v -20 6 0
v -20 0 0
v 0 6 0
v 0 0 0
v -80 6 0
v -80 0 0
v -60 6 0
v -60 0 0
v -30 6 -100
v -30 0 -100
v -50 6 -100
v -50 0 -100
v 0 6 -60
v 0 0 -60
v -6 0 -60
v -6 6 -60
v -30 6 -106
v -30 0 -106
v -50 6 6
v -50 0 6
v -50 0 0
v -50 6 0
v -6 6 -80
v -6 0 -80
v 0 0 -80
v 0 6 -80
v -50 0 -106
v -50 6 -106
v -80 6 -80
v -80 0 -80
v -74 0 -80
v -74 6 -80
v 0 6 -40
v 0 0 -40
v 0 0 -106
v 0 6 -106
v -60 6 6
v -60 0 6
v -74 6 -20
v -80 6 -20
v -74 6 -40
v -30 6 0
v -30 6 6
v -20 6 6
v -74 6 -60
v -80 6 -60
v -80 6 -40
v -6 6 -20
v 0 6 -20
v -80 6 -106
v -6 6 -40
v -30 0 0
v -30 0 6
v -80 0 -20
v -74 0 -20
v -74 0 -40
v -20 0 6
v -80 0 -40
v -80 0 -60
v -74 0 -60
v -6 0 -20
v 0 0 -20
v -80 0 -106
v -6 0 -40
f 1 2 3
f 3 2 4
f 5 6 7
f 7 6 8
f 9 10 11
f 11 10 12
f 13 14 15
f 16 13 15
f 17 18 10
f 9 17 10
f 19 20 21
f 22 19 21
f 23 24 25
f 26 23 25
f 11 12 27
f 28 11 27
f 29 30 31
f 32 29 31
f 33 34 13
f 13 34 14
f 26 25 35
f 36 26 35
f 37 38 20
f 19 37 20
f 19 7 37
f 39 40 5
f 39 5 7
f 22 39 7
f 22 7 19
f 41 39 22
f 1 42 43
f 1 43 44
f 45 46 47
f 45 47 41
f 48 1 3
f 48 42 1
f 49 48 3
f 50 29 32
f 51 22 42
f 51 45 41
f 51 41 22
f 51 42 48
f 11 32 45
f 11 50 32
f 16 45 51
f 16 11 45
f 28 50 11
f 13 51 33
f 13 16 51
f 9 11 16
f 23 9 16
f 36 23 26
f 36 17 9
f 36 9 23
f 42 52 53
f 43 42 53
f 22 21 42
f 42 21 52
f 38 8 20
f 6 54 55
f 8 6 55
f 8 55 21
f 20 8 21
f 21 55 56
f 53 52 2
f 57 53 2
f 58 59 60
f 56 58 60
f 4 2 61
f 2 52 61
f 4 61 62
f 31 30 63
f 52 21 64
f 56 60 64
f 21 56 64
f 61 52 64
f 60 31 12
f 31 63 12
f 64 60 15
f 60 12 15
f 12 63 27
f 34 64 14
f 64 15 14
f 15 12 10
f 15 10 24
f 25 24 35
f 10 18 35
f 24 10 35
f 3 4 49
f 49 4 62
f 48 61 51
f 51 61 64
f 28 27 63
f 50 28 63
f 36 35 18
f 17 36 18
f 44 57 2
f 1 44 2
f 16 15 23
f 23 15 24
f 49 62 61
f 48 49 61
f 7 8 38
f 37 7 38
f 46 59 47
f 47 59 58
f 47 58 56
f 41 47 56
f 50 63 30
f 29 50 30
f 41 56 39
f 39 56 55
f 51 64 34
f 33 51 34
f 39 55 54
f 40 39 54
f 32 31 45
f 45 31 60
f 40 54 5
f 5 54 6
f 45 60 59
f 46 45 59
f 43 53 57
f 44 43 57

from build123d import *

# Parameters (mm, degrees)
RESSALTO_EXTRUS_O1_DEPTH = 6


with BuildPart() as part:
    # Esboço1 → Ressalto-extrusão1 (new body)
    with BuildSketch(Plane(origin=(0, 0, 0), x_dir=(1, 0, 0), z_dir=(0, 1, 0))):
        Polygon((-80, 80), (-74, 80), (-74, 60), (-80, 60), (-80, 40), (-74, 40), (-74, 20), (-80, 20), (-80, 0), (-60, 0), (-60, -6), (-50, -6), (-50, 0), (-30, 0), (-30, -6), (-20, -6), (-20, 0), (0, 0), (0, 20), (-6, 20), (-6, 40), (0, 40), (0, 60), (-6, 60), (-6, 80), (0, 80), (0, 106), (-30, 106), (-30, 100), (-50, 100), (-50, 106), (-80, 106), align=None)
    extrude(amount=RESSALTO_EXTRUS_O1_DEPTH)


solid = part.part
